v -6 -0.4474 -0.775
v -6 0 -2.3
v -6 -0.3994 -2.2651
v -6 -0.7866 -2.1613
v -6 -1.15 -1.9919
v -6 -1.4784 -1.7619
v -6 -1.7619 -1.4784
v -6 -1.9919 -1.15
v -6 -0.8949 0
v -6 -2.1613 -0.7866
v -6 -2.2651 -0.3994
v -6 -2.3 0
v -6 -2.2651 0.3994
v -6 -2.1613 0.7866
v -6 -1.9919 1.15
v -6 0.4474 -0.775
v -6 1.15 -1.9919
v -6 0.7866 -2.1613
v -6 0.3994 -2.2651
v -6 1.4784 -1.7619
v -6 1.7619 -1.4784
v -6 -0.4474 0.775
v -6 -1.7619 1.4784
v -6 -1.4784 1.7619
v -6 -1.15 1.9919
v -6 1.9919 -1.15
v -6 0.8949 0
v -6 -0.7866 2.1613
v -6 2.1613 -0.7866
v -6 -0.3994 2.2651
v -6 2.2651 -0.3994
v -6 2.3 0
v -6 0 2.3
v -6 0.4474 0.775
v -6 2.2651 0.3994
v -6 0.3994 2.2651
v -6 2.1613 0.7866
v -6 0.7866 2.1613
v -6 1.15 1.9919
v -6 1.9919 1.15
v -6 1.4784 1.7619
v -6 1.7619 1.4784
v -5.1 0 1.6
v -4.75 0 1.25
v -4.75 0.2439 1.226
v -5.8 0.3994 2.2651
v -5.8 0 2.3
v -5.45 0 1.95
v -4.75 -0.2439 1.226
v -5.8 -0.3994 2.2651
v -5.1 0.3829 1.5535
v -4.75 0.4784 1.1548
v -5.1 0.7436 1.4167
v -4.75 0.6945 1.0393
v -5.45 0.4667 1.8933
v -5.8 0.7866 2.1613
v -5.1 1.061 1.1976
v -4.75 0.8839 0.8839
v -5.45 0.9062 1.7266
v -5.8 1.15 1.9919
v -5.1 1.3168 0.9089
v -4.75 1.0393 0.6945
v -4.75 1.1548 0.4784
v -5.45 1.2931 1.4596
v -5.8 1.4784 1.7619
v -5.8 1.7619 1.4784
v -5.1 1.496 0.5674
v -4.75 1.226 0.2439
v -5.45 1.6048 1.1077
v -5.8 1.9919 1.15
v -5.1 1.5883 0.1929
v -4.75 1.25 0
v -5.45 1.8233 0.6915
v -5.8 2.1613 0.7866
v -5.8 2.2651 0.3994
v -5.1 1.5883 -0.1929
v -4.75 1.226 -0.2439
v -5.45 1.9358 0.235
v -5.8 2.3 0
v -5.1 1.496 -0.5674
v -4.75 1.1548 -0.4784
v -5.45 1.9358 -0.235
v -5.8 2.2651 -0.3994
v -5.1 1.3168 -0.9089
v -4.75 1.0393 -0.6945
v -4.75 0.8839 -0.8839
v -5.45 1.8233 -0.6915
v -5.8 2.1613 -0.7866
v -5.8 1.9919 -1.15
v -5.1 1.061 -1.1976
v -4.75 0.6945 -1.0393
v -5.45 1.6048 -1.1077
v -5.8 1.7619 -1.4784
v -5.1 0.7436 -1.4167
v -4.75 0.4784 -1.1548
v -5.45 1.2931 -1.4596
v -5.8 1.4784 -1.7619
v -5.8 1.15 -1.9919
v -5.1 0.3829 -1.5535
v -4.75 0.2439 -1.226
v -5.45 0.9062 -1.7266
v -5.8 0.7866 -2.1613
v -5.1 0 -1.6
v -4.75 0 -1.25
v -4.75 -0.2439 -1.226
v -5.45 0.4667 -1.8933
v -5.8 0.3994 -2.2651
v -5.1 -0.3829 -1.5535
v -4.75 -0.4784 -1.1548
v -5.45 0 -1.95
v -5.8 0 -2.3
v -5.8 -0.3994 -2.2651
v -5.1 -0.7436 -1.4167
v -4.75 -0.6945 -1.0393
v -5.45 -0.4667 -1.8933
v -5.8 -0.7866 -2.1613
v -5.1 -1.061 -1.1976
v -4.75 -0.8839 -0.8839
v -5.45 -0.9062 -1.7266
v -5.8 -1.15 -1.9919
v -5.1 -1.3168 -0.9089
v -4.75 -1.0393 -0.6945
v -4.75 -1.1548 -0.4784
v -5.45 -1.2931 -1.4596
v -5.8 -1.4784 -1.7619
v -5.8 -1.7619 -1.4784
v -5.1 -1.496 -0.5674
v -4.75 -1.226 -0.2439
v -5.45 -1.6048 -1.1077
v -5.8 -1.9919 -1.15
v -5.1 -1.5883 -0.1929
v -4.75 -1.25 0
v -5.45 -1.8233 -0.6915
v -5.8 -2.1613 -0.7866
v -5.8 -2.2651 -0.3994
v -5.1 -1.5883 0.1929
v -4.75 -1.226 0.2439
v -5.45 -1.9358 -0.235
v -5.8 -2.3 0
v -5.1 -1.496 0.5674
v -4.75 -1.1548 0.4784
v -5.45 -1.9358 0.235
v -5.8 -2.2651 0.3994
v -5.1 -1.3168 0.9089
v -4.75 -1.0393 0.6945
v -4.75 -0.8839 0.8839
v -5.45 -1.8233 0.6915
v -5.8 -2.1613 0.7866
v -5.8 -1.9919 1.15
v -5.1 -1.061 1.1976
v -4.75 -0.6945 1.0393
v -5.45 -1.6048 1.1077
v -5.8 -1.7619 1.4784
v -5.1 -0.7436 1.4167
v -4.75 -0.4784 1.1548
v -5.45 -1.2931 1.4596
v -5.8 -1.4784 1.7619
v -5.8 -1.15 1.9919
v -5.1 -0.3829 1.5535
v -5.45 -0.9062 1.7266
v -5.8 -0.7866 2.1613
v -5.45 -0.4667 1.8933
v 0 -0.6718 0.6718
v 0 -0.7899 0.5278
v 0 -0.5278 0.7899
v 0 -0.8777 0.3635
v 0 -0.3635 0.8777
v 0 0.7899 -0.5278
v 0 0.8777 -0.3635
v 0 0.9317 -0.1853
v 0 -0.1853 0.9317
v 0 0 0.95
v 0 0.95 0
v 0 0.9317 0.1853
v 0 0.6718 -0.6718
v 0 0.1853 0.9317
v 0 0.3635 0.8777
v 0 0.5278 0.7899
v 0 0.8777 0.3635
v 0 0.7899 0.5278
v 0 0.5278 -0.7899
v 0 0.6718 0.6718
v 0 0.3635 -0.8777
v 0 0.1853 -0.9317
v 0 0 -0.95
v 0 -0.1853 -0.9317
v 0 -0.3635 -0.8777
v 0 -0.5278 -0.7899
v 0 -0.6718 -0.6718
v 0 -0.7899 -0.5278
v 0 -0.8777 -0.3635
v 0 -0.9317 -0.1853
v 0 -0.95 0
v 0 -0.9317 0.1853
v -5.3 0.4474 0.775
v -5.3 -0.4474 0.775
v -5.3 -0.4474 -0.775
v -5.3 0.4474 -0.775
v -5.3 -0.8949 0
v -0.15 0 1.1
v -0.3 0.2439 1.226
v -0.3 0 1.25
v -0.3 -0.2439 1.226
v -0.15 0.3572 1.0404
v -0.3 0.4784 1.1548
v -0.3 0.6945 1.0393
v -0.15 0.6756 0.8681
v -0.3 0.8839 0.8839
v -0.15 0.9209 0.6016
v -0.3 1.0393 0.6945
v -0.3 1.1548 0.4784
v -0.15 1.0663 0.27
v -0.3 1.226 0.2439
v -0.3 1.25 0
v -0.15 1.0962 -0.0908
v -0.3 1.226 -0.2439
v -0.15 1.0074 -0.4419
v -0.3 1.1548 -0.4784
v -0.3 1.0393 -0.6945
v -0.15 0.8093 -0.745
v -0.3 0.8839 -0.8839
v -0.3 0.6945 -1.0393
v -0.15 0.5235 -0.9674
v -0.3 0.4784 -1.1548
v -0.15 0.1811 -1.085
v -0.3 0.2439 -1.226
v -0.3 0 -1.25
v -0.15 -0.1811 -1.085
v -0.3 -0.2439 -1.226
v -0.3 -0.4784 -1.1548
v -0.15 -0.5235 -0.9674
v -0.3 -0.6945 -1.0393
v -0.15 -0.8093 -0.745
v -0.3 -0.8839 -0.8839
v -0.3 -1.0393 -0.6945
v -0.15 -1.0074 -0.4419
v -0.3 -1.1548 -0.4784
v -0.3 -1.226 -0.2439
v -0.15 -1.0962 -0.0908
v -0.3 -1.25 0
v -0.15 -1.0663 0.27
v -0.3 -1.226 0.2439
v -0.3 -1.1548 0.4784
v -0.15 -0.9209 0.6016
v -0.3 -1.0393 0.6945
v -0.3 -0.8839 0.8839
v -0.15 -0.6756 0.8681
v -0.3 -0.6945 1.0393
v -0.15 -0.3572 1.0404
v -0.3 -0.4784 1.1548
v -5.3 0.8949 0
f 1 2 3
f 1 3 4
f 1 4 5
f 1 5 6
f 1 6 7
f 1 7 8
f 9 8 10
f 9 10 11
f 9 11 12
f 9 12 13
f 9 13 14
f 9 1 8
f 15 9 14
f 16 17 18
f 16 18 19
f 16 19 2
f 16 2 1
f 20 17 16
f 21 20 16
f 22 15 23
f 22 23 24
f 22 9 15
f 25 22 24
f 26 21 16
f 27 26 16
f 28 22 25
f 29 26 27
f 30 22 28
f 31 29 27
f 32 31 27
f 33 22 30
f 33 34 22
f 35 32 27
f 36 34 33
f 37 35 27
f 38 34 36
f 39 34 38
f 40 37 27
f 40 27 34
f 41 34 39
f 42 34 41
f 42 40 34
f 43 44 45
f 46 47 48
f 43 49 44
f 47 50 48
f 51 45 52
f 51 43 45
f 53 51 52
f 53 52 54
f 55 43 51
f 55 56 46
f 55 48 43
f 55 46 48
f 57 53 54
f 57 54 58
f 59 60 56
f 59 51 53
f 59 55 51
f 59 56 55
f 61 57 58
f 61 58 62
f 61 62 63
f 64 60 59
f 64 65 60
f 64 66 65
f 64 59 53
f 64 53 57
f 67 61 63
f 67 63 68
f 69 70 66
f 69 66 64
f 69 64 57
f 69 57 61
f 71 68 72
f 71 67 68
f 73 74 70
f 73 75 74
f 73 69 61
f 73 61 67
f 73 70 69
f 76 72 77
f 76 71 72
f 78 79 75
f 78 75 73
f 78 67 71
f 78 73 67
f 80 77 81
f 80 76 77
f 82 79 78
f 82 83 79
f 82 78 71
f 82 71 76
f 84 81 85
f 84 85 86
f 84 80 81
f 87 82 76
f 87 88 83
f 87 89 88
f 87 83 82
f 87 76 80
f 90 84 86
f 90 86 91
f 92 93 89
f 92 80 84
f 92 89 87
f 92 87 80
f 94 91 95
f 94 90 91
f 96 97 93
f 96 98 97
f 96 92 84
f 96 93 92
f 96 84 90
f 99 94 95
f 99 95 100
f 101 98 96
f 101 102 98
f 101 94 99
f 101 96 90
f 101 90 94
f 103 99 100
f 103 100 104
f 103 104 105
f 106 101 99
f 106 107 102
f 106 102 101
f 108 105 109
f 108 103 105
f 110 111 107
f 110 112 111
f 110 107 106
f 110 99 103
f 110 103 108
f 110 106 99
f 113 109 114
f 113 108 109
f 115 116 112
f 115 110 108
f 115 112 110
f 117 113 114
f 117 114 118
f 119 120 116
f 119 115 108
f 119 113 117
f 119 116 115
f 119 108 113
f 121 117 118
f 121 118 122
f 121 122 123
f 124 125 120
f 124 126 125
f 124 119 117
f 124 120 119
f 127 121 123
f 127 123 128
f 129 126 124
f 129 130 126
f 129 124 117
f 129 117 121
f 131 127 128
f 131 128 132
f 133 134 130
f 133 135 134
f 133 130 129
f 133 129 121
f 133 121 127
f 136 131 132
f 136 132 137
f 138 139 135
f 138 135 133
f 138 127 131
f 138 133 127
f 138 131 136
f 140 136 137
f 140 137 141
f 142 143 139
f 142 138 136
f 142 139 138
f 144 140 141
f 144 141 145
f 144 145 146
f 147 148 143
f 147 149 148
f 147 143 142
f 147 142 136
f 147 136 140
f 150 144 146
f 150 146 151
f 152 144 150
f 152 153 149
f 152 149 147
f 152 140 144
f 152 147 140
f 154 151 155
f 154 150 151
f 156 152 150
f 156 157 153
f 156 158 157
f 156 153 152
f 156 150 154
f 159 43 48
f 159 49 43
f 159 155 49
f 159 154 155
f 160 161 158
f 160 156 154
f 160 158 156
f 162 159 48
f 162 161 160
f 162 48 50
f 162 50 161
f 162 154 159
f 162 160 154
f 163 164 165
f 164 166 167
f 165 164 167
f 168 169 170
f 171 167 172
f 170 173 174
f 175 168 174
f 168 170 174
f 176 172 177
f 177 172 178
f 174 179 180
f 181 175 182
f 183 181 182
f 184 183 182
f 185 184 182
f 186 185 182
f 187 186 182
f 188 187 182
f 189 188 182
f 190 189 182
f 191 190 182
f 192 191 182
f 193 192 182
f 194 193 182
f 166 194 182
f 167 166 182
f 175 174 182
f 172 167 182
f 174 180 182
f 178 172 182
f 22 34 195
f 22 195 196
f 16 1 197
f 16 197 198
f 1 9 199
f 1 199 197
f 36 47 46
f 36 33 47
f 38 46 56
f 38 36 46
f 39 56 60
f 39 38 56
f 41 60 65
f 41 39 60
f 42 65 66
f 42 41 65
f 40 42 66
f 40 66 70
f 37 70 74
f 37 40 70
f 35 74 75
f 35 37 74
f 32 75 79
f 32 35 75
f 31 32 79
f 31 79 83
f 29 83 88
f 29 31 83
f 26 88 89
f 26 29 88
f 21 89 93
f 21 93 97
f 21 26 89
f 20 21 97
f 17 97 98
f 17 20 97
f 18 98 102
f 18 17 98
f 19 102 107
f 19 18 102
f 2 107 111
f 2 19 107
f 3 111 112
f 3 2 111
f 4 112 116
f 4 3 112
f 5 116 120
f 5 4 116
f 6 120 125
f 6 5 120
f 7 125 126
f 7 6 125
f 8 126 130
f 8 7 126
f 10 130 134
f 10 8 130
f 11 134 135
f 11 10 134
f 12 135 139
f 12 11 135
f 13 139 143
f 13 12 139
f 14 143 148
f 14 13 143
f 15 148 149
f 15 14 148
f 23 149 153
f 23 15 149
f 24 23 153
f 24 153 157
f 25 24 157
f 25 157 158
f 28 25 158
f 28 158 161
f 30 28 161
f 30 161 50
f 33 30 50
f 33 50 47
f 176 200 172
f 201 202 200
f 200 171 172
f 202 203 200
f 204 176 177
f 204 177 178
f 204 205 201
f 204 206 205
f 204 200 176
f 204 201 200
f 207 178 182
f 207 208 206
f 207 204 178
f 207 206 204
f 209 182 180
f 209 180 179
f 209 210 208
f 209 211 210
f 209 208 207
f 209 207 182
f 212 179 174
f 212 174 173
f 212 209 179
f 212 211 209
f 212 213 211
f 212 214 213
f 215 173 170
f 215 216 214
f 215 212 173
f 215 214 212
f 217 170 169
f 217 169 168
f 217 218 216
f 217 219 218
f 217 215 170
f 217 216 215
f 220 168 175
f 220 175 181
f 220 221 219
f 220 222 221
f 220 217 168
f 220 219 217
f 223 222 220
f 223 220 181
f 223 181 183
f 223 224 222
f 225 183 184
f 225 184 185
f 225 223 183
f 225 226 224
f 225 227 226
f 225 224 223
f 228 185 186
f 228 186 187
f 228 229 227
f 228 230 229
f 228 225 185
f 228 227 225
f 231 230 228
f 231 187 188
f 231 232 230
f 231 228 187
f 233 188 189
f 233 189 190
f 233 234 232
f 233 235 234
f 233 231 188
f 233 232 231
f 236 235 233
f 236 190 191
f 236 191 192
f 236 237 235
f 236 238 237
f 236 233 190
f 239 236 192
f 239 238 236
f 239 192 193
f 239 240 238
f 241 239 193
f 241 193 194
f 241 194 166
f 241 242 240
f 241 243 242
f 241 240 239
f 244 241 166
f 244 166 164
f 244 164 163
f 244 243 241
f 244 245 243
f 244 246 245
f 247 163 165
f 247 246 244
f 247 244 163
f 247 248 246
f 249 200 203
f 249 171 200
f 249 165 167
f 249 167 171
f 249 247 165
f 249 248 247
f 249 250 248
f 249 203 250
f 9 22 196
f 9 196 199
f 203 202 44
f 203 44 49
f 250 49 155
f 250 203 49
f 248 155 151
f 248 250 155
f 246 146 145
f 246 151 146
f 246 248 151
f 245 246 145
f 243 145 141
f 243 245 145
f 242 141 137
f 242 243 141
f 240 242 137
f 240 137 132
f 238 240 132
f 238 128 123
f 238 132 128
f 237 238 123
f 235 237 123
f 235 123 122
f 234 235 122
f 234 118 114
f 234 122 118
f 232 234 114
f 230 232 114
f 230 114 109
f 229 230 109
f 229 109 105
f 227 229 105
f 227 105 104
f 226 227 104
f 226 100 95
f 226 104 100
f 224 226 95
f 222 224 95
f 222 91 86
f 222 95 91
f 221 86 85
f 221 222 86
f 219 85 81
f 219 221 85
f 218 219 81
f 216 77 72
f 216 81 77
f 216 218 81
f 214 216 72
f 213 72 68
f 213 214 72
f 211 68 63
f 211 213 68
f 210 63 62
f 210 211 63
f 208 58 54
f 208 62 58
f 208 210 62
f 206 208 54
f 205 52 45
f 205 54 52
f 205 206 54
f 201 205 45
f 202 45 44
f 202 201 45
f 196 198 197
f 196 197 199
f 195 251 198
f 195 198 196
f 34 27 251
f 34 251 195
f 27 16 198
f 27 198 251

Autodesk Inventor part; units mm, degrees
ref_plane "YZ Plane" through (0, 0, 0) normal (1, 0, 0) x (0, 1, 0)
ref_plane "XZ Plane" through (0, 0, 0) normal (0, 1, 0) x (-1, 0, 0)
ref_plane "XY Plane" through (0, 0, 0) normal (0, 0, 1) x (1, 0, 0)
sketch "スケッチ1" plane through (0, 0, 0) normal (0, 1, 0) x (-1, 0, 0)
  line L0 (0, 0) -> (4.75, 0)
  line L1 (4.75, 0) -> (4.75, 1.25)
  line L2 (0, 0.95) -> (0, 0)
  line L3 (5.8, 2.3) -> (6, 2.3)
  line L4 (6, 2.3) -> (6, 0)
  line L5 (6, 0) -> (4.75, 0)
  line L6 (4.75, 1.25) -> (0.3, 1.25)
  line L7 (0.3, 1.25) -> (0, 0.95)
  line L8 (4.75, 1.25) -> (5.8, 2.3)
  line L9 (5.8, 2.3) -> (6, 2.3)
  point P0 (6, 1.15)
  dimension "d1" = 6
  dimension "d4" = 45
  dimension "d5" = 1.25
  dimension "d6" = 0.3
  dimension "d8" = 45
  dimension "d9" = 0.2
  dimension "d10" = 1.25
revolve "回転1" add sketch "スケッチ1" angle 360 about axis through (0, 0, 0) along (-1, 0, 0)
sketch "スケッチ2" plane through (-6, 0, 0) normal (-1, 0, 0) x (0, 0, 1)
  circle A0 centre (0, 0) radius 0.95 projected
  line L0 (0, 0.8949) -> (0.775, 0.4474)
  line L1 (0.775, 0.4474) -> (0.775, -0.4474)
  line L2 (0.775, -0.4474) -> (0, -0.8949)
  line L3 (0, -0.8949) -> (-0.775, -0.4474)
  line L4 (-0.775, -0.4474) -> (-0.775, 0.4474)
  line L5 (-0.775, 0.4474) -> (0, 0.8949)
  point P0 (0, 0)
  dimension "d12" = 1.55
extrude "押し出し1" cut sketch "スケッチ2" against normal blind 0.7 contours L0 L1 L2 L3 L4 L5
thread "ねじ1" size "M2.5x0.45" class "6g" standard "ANSI Metric M Profile" length 7.0626
properties part number "CSHCS-SUS-M2_5-6"
